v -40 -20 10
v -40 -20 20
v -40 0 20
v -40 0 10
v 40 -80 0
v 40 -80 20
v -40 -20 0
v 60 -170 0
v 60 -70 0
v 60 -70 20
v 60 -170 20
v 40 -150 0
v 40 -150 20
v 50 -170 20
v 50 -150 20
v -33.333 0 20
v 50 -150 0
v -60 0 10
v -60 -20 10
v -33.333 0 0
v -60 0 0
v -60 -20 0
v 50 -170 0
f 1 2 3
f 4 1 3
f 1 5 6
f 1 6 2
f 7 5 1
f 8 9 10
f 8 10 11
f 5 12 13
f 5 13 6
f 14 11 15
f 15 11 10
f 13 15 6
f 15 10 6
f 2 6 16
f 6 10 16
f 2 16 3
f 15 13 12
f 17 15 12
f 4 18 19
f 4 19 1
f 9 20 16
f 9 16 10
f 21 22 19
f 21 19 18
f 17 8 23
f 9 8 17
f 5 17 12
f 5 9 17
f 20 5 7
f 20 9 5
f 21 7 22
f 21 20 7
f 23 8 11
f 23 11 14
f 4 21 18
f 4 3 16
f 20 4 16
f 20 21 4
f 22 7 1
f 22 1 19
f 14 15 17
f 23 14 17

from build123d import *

# Parameters (mm, degrees)
SALIENTE_EXTRUIR1_DEPTH = 20
CROQUIS2_W              = 20
CROQUIS2_H              = 20
CORTAR_EXTRUIR1_DEPTH   = 10
CROQUIS3_W              = 20
CROQUIS3_H              = 20
CORTAR_EXTRUIR2_DEPTH   = 10


with BuildPart() as part:
    # Croquis1 → Saliente-Extruir1 (new body)
    with BuildSketch(Plane.XY):
        Polygon((-60, 0), (-33.333333333, 0), (60, -70), (60, -170), (40, -170), (40, -80), (-40, -20), (-60, -20), align=None)
    extrude(amount=SALIENTE_EXTRUIR1_DEPTH)

    # Croquis2 → Cortar-Extruir1 (cut)
    with BuildSketch(Plane.XY.offset(20)):
        with Locations((-50, -10)):
            Rectangle(CROQUIS2_W, CROQUIS2_H)
    extrude(amount=-CORTAR_EXTRUIR1_DEPTH, mode=Mode.SUBTRACT)

    # Croquis3 → Cortar-Extruir2 (cut)
    with BuildSketch(Plane(origin=(40, 0, 0), x_dir=(0, 0, -1), z_dir=(1, 0, 0))):
        with Locations((-10, -160)):
            Rectangle(CROQUIS3_W, CROQUIS3_H)
    extrude(amount=CORTAR_EXTRUIR2_DEPTH, mode=Mode.SUBTRACT)


solid = part.part
